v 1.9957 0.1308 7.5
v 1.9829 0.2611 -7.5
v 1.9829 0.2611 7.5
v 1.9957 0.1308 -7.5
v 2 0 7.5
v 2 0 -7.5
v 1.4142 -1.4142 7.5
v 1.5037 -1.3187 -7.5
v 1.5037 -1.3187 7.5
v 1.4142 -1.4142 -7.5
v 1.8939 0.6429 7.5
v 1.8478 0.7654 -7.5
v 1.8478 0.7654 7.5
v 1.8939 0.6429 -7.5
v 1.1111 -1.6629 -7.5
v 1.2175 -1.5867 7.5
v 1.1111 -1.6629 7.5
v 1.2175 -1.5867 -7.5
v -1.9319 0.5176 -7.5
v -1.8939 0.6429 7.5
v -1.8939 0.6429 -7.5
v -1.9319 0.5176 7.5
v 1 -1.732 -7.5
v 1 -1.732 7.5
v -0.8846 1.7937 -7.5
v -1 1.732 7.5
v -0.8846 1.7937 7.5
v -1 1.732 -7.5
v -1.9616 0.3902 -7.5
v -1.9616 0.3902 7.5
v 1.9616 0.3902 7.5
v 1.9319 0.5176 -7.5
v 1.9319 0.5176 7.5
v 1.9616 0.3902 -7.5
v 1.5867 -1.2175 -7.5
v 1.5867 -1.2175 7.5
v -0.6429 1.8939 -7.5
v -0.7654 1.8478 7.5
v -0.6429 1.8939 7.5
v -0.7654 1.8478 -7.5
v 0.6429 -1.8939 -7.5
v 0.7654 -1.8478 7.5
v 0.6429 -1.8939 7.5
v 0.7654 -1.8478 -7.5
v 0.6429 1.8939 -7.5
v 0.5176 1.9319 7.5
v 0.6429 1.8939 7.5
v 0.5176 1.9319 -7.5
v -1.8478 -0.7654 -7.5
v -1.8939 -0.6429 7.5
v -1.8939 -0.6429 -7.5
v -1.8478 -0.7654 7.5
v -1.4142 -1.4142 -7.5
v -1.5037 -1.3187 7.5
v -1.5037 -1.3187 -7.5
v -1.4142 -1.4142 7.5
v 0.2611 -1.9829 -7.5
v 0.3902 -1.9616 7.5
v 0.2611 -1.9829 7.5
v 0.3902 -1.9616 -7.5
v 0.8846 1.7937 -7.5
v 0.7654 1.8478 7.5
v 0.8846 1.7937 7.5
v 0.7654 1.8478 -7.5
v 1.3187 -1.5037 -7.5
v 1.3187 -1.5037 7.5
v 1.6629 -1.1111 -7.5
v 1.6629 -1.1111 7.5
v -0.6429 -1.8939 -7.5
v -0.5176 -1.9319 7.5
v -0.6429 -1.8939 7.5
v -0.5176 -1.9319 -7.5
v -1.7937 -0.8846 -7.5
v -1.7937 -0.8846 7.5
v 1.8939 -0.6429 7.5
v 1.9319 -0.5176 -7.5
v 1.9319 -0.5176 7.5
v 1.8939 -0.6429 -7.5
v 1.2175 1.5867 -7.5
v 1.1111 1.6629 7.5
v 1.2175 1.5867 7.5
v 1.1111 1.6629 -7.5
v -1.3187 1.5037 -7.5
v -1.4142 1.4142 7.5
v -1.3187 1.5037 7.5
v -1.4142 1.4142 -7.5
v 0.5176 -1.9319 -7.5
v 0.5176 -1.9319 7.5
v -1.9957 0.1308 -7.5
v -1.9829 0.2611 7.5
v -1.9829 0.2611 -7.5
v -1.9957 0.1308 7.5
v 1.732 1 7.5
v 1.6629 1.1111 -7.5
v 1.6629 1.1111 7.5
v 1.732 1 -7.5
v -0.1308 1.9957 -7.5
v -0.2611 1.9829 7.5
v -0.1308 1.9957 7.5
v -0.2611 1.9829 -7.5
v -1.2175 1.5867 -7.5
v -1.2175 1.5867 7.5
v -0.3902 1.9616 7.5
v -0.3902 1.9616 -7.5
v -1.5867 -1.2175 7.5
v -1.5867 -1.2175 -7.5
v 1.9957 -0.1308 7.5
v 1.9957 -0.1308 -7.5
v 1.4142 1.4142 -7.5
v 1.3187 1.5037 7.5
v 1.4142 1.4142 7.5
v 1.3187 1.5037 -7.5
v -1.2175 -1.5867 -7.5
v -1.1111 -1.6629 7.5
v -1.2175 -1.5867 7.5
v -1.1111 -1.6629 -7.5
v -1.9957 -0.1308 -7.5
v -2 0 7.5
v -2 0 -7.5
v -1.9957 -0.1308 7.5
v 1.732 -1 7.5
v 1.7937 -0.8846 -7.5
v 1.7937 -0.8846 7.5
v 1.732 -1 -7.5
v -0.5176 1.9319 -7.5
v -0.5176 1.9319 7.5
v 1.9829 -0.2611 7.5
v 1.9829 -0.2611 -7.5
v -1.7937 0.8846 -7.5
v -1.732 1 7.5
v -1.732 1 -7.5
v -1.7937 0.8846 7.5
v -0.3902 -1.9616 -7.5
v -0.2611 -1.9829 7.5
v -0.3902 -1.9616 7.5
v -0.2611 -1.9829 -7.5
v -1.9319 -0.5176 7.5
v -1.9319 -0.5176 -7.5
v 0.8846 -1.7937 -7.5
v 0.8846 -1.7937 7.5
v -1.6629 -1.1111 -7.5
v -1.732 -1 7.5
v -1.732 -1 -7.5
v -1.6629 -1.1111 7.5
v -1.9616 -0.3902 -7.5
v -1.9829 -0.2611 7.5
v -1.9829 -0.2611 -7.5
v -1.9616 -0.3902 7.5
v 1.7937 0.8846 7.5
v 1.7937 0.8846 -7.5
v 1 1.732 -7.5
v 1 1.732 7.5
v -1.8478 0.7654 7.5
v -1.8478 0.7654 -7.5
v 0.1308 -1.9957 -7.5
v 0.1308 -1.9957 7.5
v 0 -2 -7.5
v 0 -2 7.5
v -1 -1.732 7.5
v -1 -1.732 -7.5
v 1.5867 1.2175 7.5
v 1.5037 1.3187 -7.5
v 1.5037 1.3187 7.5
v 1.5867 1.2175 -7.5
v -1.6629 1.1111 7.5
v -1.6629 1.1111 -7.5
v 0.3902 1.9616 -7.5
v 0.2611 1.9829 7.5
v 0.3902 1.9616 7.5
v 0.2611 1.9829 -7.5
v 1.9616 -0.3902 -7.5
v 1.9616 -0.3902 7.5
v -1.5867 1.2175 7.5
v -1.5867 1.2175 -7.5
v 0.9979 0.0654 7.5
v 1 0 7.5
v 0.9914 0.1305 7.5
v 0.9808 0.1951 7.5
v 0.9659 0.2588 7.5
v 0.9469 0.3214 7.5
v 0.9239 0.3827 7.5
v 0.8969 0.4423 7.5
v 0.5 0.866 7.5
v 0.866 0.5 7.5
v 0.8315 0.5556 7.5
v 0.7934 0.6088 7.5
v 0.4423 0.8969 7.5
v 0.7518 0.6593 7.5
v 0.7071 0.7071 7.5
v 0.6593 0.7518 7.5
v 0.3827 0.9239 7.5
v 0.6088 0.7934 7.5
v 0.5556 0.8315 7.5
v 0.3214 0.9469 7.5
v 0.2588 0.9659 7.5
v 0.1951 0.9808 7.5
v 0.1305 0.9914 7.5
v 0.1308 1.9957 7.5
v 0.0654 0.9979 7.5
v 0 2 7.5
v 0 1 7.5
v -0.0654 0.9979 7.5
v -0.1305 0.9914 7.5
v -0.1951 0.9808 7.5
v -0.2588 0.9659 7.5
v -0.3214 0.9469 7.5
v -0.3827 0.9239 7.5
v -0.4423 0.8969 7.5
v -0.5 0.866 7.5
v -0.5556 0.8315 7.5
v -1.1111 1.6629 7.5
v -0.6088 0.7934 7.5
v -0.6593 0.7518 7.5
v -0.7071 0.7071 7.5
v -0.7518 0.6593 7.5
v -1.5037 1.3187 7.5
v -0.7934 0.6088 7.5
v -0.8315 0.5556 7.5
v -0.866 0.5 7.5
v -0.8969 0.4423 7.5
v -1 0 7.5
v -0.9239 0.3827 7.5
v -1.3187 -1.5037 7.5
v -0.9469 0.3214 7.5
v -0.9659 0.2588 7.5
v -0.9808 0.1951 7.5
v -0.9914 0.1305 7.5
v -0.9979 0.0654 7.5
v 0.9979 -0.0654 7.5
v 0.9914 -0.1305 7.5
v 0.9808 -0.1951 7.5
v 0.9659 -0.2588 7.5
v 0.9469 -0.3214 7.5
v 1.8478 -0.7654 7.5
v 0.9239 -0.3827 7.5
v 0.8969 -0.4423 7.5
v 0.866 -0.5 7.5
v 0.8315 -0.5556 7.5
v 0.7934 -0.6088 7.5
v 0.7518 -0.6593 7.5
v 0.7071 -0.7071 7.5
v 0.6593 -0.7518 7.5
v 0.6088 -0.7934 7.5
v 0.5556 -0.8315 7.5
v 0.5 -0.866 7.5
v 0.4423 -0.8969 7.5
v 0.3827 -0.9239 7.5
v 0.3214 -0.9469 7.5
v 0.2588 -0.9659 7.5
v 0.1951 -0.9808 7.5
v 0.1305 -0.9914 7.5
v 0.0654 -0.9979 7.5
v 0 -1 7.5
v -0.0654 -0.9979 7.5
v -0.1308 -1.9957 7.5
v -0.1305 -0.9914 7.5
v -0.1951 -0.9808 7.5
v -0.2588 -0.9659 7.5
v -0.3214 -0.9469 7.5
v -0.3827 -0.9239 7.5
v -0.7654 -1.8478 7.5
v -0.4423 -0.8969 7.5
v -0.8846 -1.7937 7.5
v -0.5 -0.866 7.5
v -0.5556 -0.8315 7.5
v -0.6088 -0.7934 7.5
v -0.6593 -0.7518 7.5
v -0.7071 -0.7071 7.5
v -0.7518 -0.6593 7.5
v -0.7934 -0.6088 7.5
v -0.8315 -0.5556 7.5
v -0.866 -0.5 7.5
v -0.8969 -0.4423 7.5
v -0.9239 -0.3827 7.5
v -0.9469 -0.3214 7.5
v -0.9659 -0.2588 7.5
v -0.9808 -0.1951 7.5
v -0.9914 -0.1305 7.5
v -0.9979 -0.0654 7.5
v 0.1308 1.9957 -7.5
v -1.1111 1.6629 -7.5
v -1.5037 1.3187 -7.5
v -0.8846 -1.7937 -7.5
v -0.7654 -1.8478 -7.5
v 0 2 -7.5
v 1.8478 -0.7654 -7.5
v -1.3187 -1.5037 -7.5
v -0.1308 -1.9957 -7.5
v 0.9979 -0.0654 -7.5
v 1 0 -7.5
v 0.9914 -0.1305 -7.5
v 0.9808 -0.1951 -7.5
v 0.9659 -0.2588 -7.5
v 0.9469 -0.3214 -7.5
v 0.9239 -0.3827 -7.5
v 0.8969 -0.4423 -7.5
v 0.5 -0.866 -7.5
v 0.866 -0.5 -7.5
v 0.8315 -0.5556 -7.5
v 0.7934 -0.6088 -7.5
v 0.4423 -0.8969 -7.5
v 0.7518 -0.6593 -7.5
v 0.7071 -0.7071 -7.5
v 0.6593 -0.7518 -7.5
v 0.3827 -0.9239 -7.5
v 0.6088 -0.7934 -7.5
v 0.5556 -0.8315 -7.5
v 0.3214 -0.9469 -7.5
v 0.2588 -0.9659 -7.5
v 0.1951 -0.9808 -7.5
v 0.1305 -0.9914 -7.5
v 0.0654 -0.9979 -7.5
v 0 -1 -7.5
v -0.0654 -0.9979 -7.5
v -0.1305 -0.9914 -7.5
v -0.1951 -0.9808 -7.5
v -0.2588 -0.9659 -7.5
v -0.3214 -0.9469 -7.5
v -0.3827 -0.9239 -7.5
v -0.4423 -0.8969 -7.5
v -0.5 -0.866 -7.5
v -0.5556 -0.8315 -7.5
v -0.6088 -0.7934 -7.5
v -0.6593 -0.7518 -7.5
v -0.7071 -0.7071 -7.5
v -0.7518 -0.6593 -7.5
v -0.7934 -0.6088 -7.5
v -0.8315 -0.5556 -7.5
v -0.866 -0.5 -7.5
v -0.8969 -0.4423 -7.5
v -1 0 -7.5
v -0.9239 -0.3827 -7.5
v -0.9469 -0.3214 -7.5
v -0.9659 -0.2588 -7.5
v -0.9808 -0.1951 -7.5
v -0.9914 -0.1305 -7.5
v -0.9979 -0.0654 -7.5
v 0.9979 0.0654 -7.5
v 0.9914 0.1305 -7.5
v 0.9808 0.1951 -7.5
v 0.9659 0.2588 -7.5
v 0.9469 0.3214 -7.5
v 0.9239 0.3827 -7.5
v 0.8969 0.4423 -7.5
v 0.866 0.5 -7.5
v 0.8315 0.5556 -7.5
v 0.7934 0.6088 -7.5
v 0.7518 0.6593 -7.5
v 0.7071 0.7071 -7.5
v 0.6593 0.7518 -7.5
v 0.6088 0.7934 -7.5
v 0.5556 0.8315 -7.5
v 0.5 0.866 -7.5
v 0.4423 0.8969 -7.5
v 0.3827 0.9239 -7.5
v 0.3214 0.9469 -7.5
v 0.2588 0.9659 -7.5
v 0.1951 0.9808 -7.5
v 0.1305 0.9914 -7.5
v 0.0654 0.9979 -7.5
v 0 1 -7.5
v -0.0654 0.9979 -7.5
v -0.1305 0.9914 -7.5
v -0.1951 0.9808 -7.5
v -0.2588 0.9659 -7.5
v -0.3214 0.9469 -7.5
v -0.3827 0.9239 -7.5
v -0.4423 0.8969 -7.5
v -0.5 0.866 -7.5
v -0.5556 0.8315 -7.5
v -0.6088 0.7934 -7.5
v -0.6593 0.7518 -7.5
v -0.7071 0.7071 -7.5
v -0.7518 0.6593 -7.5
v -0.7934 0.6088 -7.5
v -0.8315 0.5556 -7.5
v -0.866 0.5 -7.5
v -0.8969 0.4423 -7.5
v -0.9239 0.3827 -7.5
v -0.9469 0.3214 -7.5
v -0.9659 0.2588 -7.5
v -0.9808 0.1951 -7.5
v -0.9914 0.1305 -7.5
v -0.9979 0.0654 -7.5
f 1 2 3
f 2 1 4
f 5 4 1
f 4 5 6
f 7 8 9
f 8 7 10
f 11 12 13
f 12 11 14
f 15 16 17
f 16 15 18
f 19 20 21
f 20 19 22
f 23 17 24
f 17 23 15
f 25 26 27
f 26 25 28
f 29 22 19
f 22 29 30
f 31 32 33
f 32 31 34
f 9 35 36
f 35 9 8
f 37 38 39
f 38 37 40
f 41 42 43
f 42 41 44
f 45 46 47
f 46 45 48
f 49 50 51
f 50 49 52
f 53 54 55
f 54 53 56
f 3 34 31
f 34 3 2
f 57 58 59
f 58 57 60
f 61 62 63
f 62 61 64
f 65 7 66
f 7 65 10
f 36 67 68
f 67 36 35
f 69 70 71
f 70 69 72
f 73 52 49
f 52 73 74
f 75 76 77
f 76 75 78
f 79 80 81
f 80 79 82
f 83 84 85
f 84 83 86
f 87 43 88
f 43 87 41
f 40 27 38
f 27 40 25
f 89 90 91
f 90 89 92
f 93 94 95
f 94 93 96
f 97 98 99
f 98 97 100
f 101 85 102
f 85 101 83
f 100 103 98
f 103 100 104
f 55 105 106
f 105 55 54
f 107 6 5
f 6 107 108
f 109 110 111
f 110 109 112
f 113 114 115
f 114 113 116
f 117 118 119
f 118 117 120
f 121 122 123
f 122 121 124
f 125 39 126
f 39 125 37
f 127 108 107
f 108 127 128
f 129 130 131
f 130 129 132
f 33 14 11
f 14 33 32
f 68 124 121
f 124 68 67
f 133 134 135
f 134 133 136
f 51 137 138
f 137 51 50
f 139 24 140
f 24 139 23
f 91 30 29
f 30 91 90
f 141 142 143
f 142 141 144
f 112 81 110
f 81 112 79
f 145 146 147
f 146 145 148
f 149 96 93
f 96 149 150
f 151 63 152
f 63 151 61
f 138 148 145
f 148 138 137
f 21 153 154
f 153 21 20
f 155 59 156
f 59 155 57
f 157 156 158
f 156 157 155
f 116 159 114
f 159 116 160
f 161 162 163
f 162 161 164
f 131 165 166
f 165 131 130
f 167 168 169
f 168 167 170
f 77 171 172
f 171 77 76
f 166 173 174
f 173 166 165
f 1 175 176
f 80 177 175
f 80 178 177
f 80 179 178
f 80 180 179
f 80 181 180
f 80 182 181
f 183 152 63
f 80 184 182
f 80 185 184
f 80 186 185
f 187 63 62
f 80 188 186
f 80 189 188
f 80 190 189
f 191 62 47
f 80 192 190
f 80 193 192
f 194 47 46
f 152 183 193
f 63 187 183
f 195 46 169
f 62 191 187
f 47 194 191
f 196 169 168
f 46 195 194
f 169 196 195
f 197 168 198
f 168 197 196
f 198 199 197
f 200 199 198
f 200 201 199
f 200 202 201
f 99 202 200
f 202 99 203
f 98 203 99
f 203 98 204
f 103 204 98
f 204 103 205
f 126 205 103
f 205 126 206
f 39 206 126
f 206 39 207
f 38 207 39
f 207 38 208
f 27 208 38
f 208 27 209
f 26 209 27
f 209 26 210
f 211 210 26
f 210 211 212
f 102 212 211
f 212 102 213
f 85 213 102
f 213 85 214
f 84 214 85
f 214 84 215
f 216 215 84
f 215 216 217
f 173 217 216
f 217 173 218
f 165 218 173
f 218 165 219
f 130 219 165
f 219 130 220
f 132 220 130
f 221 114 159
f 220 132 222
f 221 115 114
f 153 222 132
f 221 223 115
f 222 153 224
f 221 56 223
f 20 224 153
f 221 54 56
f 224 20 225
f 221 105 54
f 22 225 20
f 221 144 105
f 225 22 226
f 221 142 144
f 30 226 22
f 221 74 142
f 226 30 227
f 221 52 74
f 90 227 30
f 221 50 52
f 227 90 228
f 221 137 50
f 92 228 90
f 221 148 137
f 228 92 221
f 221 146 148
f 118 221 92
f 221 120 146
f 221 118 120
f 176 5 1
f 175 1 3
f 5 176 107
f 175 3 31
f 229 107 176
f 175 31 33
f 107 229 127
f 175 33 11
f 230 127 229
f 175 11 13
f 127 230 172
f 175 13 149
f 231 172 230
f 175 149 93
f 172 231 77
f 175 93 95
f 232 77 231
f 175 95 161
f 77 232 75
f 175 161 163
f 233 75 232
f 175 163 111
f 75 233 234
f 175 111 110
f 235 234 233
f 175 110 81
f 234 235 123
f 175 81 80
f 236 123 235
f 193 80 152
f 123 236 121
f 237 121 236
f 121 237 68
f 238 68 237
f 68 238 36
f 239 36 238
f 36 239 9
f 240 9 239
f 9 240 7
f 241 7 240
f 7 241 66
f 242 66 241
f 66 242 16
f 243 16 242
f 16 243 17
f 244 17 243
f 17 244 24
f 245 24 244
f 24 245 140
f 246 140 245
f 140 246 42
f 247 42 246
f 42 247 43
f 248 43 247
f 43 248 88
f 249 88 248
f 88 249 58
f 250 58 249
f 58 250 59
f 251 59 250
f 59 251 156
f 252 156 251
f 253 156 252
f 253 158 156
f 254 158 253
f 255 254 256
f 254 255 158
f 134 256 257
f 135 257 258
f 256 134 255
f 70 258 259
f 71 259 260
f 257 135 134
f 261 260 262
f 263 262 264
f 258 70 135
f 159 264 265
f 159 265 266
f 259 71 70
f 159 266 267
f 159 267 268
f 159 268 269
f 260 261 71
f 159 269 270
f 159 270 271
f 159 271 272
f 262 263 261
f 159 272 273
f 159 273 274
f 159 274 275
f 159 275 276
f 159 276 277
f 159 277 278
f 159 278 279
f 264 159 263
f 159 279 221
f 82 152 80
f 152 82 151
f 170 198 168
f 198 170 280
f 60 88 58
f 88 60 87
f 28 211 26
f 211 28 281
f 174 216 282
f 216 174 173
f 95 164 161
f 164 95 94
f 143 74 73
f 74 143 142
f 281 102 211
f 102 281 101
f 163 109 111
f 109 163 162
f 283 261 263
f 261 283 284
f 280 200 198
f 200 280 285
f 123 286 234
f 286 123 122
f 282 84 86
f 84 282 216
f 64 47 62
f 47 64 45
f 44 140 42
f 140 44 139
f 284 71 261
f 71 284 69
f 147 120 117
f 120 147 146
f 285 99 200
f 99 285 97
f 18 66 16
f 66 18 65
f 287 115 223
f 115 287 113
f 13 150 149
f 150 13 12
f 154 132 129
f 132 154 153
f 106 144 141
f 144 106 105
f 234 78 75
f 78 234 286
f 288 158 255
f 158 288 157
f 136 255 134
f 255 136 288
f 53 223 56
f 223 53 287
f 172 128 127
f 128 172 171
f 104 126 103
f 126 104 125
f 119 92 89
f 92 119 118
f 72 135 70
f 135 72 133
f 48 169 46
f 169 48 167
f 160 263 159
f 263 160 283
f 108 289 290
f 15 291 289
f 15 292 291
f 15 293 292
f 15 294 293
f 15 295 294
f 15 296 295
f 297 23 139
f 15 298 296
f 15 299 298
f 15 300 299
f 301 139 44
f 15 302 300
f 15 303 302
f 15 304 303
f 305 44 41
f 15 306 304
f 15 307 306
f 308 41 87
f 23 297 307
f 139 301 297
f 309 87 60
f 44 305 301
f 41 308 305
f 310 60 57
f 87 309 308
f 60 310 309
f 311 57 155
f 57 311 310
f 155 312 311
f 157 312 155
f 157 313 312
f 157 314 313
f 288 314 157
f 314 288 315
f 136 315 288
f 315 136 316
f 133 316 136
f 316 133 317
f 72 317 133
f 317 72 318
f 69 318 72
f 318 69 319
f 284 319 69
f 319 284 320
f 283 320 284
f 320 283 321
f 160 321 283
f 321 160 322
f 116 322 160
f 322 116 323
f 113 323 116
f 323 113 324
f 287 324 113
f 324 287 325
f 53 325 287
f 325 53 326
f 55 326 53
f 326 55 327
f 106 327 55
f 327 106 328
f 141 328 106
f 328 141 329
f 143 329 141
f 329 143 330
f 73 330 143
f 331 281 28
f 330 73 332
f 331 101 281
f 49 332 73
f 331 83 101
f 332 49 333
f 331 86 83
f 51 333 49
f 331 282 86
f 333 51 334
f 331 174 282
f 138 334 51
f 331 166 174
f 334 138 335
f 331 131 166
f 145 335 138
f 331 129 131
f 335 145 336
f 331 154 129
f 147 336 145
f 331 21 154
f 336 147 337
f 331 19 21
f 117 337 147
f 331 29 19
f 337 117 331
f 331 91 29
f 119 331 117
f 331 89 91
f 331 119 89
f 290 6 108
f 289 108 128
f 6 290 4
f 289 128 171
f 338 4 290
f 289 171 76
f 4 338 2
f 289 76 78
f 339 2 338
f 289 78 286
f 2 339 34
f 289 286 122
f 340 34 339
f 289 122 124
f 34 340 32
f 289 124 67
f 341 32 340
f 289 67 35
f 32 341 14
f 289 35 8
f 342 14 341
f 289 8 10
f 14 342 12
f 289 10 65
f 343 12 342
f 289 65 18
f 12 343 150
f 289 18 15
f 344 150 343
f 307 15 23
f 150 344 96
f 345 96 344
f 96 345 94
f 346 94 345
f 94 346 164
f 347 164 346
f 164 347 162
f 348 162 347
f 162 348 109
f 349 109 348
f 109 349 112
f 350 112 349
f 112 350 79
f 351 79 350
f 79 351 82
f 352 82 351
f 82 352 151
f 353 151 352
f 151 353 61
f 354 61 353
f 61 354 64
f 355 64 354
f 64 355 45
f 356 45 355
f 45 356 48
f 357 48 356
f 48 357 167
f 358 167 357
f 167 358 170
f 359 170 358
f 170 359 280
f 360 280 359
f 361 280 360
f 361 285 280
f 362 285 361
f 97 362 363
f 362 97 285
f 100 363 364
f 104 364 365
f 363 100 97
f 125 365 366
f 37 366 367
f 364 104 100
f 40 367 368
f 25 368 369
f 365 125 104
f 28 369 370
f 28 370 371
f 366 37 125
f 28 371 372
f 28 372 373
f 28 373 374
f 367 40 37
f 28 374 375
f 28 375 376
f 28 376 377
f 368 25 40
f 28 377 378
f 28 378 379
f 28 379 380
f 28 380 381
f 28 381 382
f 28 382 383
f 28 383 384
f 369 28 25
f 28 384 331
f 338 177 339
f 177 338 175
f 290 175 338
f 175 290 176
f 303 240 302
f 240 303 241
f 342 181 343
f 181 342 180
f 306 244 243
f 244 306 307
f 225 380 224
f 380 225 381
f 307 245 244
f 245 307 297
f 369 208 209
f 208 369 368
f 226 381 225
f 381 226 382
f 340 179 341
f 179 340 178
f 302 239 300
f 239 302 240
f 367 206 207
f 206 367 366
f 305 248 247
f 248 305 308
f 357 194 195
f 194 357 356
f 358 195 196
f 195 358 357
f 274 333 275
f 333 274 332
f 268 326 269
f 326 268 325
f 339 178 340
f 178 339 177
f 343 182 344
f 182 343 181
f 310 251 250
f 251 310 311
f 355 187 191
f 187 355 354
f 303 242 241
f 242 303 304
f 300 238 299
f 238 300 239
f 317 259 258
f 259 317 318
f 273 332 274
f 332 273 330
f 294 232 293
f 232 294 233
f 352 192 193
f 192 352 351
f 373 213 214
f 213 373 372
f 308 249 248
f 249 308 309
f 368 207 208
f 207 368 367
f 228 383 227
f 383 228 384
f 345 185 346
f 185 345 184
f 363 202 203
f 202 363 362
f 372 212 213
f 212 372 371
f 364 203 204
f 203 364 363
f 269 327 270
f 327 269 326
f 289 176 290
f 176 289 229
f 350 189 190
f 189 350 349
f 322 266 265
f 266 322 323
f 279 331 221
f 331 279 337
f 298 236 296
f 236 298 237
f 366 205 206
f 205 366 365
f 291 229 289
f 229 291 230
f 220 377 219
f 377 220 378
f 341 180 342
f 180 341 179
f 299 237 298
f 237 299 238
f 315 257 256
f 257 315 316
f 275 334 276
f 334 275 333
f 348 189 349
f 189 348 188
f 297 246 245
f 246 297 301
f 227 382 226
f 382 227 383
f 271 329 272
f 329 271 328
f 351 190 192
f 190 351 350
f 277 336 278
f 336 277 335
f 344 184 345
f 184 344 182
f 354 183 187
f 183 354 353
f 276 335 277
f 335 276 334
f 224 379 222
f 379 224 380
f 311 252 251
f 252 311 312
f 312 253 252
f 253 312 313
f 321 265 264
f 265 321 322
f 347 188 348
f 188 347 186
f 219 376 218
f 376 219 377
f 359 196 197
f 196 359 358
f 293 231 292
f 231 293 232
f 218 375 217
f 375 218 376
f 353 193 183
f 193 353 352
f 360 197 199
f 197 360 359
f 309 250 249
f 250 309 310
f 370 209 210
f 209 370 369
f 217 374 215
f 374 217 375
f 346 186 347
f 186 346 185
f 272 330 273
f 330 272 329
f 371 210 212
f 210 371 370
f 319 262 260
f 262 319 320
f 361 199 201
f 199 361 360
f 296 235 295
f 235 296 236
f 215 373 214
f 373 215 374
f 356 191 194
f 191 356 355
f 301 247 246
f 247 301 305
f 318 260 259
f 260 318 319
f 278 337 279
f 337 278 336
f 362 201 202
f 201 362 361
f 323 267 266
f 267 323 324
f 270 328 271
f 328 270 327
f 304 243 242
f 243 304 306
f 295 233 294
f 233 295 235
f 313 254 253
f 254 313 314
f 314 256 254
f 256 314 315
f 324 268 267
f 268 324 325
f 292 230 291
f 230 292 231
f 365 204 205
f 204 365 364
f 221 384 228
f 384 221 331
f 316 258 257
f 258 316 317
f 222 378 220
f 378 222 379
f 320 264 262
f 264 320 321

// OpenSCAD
// Parameters
length = 15; //[8:30:1]
outer_diameter = 4; //[2:8:0.5]
inner_diameter = 2; //[1:6:0.5]
center = 1; //[0:1:1]
forced_id = 0; //[0:6:0.5]
eps_overlap = 0.8; //[0.5:2:0.1]

$fn = 96;

// Tubing - PTFE sleeving (single connected solid)
module tubing() {
  od = max(outer_diameter, 0.01);
  id_req = (forced_id > 0) ? forced_id : inner_diameter;

  // Ensure a valid, visible wall thickness and non-negative ID
  min_wall = 0.2;
  id = min(max(id_req, 0), max(0, od - 2*min_wall));

  // Positioning: if centered, keep at origin; if not, sit on Z=0 plane
  zc = (center == 1) ? 0 : length/2;

  color([0.85, 0.85, 0.8])
  translate([0, 0, zc])
  difference() {
    cylinder(h=length, r=od/2, center=true);
    cylinder(h=length + 2*eps_overlap, r=id/2, center=true);
  }
}

tubing();
